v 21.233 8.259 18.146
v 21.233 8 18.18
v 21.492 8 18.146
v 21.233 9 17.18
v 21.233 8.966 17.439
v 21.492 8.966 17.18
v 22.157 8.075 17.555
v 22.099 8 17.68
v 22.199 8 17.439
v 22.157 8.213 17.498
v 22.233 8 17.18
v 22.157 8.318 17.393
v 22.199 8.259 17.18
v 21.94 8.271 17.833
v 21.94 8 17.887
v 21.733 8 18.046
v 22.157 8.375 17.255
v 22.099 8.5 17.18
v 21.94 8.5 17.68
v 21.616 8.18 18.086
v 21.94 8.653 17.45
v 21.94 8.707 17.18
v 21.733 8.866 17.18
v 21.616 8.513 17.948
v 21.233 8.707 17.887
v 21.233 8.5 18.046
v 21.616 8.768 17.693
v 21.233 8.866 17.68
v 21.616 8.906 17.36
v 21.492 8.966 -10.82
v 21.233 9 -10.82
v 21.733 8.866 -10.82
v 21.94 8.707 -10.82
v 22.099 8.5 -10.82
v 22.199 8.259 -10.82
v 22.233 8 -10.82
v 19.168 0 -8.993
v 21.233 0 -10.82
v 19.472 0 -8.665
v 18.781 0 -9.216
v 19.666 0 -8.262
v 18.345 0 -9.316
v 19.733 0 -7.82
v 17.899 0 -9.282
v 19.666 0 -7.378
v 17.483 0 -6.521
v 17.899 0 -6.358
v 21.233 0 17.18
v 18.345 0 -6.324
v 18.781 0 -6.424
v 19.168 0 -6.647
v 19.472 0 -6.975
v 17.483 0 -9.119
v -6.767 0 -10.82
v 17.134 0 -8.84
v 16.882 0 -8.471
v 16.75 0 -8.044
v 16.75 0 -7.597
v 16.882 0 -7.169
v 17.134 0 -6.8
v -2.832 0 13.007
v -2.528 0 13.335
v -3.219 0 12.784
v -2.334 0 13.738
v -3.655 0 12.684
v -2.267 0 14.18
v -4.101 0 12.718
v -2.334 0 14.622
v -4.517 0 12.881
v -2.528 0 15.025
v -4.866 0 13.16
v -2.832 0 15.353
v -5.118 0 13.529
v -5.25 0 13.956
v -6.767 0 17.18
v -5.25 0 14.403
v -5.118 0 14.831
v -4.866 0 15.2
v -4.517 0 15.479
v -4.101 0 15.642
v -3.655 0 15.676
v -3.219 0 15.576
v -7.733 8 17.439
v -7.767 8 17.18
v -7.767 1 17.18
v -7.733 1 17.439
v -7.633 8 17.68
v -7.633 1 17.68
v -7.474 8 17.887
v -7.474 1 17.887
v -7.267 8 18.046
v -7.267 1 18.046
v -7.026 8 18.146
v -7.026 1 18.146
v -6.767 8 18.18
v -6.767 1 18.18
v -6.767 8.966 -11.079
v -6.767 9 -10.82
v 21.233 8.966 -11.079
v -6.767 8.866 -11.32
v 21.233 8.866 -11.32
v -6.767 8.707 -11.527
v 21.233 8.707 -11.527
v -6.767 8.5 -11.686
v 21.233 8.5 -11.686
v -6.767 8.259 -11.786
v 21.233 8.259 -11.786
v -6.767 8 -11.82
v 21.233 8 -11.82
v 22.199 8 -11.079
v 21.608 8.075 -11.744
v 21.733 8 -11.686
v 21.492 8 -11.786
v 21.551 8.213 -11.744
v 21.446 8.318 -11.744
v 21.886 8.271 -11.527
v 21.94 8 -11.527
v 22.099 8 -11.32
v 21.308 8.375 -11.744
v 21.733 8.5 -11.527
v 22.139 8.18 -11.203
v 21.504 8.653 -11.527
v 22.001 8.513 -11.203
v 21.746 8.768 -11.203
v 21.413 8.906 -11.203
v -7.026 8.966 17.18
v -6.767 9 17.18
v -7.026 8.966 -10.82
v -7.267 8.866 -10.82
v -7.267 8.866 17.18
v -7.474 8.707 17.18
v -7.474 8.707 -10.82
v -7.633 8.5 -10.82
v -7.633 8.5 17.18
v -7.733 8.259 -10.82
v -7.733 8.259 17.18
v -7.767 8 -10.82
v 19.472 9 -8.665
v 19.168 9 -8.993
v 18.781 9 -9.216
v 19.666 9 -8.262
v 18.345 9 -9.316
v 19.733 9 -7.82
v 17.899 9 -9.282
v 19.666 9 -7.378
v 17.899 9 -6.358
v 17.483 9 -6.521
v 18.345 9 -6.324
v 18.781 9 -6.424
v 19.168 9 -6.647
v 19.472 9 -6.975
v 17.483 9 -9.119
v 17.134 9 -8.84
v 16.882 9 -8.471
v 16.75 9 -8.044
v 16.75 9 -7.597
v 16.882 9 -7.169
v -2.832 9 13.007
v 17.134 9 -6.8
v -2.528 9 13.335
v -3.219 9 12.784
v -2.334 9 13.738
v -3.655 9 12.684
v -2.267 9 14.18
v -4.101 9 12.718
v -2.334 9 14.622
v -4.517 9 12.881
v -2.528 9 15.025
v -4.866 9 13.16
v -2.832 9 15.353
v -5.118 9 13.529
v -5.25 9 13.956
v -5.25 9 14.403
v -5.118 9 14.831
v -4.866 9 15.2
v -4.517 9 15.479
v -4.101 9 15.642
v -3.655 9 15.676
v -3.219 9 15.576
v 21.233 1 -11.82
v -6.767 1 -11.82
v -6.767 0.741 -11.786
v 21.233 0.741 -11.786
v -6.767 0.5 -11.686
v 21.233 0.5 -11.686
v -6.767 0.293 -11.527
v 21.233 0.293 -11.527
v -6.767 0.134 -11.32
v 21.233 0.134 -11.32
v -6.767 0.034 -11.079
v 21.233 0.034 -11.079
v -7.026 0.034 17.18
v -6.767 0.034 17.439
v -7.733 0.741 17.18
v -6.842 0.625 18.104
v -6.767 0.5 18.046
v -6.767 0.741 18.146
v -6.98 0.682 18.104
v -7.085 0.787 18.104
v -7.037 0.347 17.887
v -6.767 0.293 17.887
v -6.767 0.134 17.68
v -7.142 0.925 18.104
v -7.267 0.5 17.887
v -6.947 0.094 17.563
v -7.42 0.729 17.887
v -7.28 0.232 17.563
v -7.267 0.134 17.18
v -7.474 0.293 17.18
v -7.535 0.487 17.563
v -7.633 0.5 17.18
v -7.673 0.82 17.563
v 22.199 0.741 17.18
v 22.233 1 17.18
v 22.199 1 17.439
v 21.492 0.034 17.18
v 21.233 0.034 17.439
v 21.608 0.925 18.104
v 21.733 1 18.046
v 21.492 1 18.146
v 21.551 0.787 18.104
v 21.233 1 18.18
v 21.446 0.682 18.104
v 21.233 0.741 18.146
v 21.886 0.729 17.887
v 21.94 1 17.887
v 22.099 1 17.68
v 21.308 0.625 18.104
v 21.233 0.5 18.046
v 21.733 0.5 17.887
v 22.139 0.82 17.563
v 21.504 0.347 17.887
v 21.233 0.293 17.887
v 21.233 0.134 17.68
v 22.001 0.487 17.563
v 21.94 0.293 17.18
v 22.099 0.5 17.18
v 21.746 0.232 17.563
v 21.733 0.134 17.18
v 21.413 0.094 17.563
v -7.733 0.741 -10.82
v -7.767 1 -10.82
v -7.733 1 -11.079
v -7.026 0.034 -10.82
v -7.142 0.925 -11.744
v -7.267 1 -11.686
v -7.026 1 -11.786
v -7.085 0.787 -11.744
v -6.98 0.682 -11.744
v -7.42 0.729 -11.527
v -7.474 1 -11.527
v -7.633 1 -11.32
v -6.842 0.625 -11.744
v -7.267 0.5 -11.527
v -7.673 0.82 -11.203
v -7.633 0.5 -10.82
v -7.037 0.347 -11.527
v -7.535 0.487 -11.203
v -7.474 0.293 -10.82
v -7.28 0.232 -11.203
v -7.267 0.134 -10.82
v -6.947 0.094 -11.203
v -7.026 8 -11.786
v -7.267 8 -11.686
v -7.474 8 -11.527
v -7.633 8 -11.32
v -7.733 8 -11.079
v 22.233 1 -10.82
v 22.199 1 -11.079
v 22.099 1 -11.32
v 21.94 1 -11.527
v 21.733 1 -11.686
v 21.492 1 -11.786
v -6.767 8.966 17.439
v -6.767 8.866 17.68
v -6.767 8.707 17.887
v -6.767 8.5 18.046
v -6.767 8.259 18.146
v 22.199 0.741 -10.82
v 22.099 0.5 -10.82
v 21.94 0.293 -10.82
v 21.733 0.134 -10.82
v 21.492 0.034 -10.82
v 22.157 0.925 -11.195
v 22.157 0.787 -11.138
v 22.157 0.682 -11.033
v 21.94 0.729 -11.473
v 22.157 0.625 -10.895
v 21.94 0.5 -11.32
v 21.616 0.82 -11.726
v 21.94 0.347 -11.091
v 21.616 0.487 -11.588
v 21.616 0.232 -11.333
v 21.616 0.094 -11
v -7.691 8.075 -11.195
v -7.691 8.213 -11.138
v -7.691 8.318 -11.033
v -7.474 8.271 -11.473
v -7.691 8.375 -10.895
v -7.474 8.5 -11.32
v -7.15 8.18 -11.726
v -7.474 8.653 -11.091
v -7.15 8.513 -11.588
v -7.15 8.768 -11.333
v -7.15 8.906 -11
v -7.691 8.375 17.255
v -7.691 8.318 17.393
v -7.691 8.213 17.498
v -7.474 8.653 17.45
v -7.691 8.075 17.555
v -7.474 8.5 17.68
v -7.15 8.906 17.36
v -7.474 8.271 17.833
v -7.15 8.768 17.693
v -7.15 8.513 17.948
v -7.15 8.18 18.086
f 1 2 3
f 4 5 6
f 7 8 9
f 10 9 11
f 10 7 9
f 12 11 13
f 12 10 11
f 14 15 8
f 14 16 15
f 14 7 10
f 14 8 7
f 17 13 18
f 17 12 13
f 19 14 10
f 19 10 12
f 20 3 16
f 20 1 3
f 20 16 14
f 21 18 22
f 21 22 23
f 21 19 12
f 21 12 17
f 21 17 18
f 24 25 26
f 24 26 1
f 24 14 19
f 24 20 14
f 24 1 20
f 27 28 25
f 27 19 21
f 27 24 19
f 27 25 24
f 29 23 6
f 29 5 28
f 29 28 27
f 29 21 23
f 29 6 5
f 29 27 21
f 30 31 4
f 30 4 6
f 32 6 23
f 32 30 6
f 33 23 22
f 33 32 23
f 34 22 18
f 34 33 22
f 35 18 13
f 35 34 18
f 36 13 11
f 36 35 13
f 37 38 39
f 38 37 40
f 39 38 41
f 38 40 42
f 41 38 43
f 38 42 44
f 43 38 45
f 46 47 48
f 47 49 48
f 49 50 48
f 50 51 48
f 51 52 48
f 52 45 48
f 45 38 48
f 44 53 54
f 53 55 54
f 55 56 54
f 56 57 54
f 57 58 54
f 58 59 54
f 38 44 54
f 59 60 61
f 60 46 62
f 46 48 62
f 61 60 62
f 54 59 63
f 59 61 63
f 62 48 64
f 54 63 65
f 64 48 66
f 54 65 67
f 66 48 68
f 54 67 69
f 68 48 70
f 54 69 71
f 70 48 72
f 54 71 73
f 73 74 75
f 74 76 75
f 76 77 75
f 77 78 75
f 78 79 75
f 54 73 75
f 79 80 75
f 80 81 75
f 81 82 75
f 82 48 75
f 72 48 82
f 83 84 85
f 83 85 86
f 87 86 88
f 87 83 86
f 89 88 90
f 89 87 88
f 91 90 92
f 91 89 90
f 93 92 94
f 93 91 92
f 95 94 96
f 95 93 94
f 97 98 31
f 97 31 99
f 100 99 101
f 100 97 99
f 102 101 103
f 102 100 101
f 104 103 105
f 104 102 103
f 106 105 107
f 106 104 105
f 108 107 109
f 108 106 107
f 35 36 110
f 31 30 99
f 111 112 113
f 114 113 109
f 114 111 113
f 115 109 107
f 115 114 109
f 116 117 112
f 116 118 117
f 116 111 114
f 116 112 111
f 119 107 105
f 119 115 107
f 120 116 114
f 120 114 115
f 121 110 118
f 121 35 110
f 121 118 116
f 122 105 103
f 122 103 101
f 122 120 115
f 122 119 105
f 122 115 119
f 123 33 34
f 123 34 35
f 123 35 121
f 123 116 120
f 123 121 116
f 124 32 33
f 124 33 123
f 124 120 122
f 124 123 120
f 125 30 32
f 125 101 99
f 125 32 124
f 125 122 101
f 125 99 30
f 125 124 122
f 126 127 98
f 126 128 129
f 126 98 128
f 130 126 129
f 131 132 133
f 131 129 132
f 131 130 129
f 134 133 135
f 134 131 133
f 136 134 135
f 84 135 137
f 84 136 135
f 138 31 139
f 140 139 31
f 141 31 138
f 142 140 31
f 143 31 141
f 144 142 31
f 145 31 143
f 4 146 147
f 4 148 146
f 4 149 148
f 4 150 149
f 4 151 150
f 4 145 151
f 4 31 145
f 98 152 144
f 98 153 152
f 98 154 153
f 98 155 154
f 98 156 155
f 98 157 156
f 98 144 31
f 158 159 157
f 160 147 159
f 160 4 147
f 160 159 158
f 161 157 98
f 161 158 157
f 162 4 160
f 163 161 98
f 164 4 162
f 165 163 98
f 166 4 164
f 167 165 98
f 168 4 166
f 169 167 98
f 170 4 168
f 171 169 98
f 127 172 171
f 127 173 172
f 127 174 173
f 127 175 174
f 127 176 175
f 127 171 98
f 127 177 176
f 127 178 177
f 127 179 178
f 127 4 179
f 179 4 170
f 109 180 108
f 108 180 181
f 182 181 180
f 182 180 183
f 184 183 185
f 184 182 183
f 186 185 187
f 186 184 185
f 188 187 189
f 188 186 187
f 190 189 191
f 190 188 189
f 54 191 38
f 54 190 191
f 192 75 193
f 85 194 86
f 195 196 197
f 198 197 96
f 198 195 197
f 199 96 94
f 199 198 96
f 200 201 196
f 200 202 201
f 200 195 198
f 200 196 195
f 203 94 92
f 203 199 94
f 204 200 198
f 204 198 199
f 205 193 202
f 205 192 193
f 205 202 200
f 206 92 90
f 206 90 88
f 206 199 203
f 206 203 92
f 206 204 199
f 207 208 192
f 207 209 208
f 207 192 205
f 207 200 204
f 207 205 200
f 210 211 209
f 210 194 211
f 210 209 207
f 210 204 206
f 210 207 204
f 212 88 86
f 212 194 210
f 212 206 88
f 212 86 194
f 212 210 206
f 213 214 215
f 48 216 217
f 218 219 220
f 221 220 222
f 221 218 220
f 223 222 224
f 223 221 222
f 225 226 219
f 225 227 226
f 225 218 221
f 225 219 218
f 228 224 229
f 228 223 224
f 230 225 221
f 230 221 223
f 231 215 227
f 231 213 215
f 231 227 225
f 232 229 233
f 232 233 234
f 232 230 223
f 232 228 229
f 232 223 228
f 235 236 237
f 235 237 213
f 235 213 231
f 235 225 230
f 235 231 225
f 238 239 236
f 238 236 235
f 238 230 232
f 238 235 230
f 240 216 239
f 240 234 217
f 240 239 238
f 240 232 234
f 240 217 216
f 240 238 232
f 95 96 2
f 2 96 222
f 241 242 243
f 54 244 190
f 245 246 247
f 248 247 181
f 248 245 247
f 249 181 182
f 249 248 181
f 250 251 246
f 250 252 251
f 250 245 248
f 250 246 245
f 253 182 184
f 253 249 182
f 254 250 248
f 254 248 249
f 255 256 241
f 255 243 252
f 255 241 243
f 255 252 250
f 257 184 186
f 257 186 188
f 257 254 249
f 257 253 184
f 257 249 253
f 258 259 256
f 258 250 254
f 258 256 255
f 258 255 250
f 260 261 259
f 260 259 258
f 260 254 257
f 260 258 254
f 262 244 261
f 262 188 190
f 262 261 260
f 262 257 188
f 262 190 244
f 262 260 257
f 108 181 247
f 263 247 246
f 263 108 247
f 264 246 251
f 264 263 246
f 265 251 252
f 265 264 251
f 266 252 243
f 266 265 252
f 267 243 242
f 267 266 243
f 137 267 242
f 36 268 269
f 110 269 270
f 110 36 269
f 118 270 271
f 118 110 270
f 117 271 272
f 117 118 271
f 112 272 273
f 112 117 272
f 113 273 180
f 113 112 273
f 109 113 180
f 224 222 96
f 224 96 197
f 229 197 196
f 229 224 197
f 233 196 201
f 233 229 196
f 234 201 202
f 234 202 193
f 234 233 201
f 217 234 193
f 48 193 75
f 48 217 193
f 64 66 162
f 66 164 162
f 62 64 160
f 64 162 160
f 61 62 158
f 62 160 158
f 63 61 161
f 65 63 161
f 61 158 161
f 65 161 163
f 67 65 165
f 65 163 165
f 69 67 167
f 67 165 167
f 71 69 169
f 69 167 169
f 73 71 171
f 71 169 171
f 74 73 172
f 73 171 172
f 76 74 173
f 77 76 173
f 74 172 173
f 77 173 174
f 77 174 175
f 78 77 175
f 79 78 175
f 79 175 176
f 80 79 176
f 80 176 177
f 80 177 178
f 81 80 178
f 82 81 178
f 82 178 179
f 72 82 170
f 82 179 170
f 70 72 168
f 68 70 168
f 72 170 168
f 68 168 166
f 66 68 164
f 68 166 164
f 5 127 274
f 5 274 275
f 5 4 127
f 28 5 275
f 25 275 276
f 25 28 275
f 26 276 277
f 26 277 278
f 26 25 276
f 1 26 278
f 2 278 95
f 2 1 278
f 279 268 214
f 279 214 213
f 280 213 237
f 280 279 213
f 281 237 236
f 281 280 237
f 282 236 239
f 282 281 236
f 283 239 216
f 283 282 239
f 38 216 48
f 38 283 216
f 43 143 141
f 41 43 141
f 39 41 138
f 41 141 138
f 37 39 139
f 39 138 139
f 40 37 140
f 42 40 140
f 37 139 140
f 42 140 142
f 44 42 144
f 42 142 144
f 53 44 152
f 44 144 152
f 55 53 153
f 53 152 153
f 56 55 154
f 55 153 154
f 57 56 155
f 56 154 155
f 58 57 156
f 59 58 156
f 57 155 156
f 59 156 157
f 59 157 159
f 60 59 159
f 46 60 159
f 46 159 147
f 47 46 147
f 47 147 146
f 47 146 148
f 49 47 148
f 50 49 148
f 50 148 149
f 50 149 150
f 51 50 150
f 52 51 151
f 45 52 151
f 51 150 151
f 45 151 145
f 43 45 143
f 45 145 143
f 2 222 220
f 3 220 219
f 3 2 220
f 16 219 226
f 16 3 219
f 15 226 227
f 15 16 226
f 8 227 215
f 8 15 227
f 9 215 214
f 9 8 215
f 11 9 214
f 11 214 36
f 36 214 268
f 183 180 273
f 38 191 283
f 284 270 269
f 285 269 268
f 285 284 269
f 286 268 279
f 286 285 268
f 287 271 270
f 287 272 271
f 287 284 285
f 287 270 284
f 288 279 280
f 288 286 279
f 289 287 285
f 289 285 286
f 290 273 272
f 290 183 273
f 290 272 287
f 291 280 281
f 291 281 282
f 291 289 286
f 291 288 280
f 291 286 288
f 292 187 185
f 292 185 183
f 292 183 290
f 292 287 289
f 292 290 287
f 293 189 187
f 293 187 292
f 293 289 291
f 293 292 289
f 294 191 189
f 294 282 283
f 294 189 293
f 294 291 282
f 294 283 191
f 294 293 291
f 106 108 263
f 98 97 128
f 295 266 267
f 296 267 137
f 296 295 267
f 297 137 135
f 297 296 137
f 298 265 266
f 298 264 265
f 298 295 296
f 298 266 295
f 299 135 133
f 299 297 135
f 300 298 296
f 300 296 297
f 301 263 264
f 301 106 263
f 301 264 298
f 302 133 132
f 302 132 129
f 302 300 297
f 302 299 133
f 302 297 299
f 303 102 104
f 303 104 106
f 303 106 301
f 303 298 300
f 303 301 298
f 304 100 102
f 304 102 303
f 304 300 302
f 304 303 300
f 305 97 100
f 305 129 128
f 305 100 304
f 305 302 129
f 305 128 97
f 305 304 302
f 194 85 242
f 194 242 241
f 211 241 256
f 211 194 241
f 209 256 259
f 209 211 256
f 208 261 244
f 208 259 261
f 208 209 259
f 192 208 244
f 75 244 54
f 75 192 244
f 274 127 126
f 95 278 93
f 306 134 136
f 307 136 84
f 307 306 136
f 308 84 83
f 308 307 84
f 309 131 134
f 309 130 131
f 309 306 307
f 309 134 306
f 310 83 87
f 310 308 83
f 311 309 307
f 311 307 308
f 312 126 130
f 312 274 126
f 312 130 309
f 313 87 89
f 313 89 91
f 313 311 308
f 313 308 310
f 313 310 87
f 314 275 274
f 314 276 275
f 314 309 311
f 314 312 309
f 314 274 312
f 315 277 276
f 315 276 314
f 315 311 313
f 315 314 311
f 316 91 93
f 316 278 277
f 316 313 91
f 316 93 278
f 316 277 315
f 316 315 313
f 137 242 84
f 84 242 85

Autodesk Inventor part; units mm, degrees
ref_plane "YZ Plane" through (0, 0, 0) normal (1, 0, 0) x (0, 1, 0)
ref_plane "XZ Plane" through (0, 0, 0) normal (0, 1, 0) x (-1, 0, 0)
ref_plane "XY Plane" through (0, 0, 0) normal (0, 0, 1) x (1, 0, 0)
sketch "Esquisse1" plane through (0, 0, 0) normal (0, 1, 0) x (-1, 0, 0)
  line L0 (7.7669, 18.1799) -> (-22.2331, 18.1799)
  line L1 (-22.2331, 18.1799) -> (-22.2331, -11.8201)
  line L2 (-22.2331, -11.8201) -> (7.7669, -11.8201)
  line L3 (7.7669, -11.8201) -> (7.7669, 18.1799)
  point P0 (0, 0)
  dimension "d0" = 30
  dimension "d1" = 30
extrude "Extrusion1" add sketch "Esquisse1" along normal blind 9
sketch "Esquisse2" plane through (0, 9, 0) normal (0, 1, 0) x (1, 0, 0)
  circle A0 centre (-3.7669, -14.1799) radius 1.5
  circle A1 centre (18.2331, 7.8201) radius 1.5
  line L0 (-7.7669, 11.8201) -> (-7.7669, -18.1799) projected
  line L1 (-7.7669, -18.1799) -> (22.2331, -18.1799) projected
  line L2 (22.2331, 11.8201) -> (-7.7669, 11.8201) projected
  line L3 (22.2331, -18.1799) -> (22.2331, 11.8201) projected
  point P0 (0, 0)
  dimension "d4" = 3
  dimension "d5" = 3
  dimension "d6" = 4
  dimension "d8" = 4
  dimension "d9" = 4
  dimension "d13" = 4
extrude "Extrusion2" cut sketch "Esquisse2" against normal blind 10 contours A0 | A1
fillet "Congé1" radius 1 12 edges at (7.2331, 9, 18.1799) (22.2331, 9, 3.1799) (7.2331, 9, -11.8201) (-7.7669, 9, 3.1799) (-7.7669, 0, 3.1799) (7.2331, 0, -11.8201) (22.2331, 0, 3.1799) (7.2331, 0, 18.1799) (22.2331, 4.5, 18.1799) (22.2331, 4.5, -11.8201) (-7.7669, 4.5, -11.8201) (-7.7669, 4.5, 18.1799)
properties part number "calle-patin"
